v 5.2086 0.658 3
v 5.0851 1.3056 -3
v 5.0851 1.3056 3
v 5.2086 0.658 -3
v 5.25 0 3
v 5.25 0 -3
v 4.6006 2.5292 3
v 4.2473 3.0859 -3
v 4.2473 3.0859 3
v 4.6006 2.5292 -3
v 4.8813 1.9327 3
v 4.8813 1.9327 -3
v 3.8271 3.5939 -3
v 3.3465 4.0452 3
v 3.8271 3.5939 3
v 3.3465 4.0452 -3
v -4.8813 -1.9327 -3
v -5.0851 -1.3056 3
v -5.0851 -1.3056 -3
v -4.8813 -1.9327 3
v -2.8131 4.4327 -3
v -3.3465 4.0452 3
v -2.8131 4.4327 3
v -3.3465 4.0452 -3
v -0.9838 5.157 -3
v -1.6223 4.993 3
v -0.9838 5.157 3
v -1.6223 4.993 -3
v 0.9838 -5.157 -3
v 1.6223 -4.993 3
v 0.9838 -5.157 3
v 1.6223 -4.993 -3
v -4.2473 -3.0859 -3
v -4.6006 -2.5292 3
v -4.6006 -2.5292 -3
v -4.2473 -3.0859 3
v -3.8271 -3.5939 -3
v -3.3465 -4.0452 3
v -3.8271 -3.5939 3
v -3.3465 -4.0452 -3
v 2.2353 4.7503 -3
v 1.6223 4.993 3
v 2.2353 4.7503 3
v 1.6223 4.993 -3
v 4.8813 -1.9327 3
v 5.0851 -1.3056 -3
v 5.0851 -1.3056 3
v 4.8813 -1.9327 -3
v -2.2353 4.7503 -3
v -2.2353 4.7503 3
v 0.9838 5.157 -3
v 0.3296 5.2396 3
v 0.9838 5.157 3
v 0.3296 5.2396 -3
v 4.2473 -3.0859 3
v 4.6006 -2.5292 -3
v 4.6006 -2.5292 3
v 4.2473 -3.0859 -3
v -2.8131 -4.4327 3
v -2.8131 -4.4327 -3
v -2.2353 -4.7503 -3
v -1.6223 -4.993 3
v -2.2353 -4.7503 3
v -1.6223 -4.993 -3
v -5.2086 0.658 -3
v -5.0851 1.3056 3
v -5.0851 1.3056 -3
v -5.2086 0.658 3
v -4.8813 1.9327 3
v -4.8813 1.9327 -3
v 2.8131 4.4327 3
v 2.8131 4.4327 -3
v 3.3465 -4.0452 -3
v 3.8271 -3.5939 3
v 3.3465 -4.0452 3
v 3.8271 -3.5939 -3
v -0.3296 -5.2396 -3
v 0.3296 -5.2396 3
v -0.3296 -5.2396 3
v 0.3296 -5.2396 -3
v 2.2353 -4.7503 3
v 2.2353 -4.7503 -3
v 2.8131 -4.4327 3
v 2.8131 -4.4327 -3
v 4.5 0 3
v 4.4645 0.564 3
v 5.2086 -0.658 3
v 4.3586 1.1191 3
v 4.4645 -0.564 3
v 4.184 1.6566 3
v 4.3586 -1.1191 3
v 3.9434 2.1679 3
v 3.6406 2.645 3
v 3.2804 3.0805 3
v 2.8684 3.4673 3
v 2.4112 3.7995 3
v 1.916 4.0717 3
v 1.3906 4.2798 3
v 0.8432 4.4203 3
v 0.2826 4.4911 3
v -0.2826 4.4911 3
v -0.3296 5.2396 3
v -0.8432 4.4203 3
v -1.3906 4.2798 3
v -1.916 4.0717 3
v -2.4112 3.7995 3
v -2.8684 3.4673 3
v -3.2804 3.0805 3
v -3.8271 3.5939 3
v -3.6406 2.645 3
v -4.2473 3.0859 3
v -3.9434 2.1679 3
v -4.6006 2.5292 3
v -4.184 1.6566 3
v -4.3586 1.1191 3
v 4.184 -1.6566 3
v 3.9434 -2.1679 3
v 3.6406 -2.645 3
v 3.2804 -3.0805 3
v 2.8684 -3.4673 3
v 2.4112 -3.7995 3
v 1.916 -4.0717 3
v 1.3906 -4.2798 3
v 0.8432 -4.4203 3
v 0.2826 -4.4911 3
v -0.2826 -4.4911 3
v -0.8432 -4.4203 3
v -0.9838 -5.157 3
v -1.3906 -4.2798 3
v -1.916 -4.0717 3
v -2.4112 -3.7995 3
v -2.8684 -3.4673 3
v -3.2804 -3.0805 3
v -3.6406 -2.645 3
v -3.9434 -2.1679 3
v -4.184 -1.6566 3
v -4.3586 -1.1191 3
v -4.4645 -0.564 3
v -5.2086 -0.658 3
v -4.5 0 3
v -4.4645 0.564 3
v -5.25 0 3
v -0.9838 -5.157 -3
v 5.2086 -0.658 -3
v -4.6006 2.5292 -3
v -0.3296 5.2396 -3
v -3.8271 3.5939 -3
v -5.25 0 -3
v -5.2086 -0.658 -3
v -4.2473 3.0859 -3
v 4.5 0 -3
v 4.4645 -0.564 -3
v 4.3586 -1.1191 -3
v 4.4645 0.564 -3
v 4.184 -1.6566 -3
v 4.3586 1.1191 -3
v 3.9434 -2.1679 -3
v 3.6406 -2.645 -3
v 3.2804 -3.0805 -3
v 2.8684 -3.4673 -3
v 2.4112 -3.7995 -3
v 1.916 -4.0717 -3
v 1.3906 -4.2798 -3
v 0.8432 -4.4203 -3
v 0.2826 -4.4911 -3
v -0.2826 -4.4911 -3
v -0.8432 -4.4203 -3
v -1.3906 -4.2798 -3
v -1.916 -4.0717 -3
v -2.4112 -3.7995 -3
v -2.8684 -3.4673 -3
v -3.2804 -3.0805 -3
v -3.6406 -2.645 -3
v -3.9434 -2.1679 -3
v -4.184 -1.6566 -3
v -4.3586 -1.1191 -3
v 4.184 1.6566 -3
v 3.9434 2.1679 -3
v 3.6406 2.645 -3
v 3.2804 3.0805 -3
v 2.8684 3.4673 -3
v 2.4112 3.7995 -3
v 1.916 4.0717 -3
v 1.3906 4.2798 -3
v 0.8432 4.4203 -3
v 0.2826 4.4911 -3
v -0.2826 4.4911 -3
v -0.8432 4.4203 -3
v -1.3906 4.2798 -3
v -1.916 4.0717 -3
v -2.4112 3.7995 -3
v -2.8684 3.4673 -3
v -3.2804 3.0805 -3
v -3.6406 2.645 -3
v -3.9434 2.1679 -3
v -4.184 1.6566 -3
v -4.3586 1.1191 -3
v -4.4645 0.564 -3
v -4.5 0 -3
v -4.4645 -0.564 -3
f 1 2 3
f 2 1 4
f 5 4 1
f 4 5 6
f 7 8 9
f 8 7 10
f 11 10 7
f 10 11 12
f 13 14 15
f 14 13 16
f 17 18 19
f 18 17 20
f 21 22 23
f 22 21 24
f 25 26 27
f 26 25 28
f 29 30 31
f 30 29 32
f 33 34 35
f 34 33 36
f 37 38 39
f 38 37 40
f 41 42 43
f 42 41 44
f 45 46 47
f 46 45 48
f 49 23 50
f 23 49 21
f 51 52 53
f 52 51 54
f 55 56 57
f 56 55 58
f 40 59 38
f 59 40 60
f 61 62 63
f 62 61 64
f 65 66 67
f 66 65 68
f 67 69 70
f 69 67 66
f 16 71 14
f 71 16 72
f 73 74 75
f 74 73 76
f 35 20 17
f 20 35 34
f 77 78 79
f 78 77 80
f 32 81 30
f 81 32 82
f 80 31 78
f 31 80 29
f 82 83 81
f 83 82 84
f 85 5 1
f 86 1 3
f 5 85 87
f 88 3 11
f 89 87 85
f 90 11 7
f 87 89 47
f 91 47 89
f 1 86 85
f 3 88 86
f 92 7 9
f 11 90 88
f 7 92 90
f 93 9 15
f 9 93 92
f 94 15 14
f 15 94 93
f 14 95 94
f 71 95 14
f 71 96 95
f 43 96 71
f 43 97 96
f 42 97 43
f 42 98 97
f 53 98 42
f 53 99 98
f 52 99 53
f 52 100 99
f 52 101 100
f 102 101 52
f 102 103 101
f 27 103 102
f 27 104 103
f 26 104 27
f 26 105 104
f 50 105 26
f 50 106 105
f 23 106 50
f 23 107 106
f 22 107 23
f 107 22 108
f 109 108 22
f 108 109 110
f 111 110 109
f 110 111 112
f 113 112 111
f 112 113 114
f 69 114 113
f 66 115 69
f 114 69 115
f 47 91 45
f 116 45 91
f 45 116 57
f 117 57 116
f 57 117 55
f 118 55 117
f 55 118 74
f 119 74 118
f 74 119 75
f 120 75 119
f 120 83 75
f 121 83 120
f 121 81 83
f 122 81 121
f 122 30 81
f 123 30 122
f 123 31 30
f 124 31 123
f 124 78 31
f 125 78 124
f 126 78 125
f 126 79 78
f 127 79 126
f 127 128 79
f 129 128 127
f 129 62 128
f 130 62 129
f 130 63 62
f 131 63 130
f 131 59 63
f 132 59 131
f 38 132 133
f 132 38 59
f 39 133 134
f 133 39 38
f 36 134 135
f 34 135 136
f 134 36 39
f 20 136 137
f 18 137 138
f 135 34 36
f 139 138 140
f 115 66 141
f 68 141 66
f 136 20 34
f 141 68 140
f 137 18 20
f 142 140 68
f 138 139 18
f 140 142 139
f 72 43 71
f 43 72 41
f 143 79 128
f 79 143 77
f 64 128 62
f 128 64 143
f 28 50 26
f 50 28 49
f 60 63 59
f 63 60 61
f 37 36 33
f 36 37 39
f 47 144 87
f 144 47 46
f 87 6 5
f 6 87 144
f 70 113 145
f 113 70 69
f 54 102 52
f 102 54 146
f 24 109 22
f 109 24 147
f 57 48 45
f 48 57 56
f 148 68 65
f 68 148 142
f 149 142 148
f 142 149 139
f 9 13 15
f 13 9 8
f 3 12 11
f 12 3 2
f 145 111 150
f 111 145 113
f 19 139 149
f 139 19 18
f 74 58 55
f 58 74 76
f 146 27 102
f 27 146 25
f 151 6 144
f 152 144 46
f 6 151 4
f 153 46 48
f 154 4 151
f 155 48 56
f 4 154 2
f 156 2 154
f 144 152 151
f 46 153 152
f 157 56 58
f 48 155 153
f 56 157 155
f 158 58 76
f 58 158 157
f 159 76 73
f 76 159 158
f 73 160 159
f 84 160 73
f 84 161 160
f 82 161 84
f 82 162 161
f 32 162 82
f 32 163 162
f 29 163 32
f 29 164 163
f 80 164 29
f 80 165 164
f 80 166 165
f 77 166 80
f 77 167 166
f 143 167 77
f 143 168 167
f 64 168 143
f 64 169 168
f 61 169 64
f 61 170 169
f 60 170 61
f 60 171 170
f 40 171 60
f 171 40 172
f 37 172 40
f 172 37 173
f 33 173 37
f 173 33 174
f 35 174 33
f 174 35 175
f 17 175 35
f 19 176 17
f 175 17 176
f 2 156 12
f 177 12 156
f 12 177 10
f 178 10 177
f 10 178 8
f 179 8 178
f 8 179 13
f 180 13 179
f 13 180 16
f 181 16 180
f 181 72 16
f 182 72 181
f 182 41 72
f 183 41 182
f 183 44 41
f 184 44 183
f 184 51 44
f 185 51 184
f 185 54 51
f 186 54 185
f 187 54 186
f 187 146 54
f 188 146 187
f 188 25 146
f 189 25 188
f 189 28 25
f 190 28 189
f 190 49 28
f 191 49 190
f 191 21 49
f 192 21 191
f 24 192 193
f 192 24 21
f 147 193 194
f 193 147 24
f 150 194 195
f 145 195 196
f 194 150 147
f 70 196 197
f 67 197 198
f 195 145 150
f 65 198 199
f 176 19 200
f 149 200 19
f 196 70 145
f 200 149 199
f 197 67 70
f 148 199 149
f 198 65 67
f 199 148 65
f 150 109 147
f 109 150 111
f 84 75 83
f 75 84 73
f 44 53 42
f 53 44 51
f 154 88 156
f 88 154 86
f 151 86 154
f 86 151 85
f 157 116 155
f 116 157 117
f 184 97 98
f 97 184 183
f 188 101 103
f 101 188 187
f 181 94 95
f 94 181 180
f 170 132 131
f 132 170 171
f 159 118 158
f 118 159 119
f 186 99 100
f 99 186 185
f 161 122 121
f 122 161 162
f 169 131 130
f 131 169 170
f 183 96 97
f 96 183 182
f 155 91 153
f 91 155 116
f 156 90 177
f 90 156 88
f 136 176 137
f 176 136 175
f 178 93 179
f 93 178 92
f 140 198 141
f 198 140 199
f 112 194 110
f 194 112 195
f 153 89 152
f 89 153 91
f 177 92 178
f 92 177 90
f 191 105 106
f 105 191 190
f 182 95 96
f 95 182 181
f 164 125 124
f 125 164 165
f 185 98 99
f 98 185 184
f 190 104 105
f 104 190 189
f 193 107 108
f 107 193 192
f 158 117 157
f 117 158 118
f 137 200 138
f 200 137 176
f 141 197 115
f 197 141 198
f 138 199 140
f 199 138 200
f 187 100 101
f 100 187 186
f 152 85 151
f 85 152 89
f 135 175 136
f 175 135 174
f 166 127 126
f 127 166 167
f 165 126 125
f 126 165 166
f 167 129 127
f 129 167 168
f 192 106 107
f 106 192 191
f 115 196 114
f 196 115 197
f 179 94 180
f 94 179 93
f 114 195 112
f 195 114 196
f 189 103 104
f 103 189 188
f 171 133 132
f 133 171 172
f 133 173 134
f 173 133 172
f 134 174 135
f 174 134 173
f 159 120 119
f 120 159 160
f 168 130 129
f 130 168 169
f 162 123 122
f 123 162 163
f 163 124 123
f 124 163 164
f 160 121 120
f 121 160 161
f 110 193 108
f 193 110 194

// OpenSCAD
$fn = 50;


difference() {
	union() {
		translate(v = [0, 0, -3.0000000000]) {
			cylinder(h = 6, r = 5.2500000000);
		}
	}
	union() {
		translate(v = [0, 0, -100.0000000000]) {
			cylinder(h = 200, r = 4.5000000000);
		}
	}
}
